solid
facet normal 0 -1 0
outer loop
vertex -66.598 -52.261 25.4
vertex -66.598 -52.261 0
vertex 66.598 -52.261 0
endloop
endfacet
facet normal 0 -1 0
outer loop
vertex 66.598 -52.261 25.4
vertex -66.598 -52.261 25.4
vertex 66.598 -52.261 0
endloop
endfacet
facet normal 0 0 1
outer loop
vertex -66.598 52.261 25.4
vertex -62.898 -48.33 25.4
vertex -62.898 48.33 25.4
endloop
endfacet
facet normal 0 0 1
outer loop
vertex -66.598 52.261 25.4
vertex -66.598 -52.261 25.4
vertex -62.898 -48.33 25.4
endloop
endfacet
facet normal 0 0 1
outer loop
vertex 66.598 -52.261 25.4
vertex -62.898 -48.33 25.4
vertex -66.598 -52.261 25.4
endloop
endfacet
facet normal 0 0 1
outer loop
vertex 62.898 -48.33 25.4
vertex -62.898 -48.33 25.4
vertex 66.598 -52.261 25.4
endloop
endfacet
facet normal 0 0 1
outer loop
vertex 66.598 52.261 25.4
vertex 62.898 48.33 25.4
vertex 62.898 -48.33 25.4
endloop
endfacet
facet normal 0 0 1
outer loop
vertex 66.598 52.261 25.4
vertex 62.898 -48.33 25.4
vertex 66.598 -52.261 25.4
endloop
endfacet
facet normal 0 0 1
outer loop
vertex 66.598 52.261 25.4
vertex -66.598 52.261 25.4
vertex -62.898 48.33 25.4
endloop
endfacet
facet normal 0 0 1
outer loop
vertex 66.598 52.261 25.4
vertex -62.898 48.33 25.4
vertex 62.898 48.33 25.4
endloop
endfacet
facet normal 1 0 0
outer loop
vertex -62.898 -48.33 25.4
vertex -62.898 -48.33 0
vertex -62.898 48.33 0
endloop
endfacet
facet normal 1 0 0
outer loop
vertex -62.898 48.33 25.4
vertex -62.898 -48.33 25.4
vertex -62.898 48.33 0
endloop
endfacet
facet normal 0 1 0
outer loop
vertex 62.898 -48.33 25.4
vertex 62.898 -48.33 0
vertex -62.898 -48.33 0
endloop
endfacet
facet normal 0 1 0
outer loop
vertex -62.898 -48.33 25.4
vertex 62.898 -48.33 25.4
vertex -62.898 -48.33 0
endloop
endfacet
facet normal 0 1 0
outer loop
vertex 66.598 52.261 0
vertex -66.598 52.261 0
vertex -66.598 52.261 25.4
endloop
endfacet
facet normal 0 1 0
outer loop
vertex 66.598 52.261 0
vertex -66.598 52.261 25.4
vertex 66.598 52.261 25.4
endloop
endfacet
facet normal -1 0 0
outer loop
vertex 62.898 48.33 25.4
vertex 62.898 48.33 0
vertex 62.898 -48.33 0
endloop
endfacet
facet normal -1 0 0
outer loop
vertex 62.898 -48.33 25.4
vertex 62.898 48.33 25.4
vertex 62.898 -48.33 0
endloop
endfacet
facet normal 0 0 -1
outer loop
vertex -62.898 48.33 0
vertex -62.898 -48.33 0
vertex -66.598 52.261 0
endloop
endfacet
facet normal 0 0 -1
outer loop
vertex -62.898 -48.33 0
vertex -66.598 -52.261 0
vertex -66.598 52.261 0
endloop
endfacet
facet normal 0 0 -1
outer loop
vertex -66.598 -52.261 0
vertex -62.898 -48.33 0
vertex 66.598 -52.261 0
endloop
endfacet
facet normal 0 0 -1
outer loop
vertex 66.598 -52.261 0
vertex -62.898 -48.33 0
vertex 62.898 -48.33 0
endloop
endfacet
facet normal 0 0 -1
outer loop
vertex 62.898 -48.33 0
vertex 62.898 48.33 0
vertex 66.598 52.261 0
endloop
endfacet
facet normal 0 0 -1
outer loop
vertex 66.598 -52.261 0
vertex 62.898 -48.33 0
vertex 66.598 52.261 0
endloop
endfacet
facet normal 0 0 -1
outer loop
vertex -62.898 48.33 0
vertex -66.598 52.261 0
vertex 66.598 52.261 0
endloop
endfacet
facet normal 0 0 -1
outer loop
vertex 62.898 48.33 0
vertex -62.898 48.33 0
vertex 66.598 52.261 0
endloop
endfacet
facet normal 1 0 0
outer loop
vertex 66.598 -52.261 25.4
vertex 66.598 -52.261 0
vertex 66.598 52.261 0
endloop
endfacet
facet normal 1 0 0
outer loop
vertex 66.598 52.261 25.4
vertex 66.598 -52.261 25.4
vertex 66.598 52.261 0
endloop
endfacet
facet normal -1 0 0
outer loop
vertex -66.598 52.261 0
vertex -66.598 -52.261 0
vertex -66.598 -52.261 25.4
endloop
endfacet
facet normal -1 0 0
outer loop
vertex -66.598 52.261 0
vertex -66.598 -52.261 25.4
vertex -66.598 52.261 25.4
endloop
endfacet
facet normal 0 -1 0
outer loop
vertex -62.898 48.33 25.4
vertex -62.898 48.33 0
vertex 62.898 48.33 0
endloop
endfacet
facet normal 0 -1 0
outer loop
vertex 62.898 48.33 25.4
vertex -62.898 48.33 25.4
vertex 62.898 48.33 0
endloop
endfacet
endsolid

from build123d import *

# Parameters (mm, degrees)
F0_W     = 133.195832
F0_H     = 104.52173
F1_DEPTH = 25.4


with BuildPart() as f1:
    # F0 (on Top) → F1 (new body)
    with BuildSketch(Plane.XY):
        Rectangle(F0_W, F0_H)
        Polygon((-62.898032, -7.168526), (-62.898032, 48.329741), (-37.461329, 48.329741), (-34.455173, 48.329741), (2.312429, 48.329741), (62.898032, 48.329741), (62.898032, 26.824163), (62.898032, -48.329741), (-62.898032, -48.329741), (-62.898032, -9.24971), align=None, mode=Mode.SUBTRACT)
    extrude(amount=F1_DEPTH)


solid = f1.part
